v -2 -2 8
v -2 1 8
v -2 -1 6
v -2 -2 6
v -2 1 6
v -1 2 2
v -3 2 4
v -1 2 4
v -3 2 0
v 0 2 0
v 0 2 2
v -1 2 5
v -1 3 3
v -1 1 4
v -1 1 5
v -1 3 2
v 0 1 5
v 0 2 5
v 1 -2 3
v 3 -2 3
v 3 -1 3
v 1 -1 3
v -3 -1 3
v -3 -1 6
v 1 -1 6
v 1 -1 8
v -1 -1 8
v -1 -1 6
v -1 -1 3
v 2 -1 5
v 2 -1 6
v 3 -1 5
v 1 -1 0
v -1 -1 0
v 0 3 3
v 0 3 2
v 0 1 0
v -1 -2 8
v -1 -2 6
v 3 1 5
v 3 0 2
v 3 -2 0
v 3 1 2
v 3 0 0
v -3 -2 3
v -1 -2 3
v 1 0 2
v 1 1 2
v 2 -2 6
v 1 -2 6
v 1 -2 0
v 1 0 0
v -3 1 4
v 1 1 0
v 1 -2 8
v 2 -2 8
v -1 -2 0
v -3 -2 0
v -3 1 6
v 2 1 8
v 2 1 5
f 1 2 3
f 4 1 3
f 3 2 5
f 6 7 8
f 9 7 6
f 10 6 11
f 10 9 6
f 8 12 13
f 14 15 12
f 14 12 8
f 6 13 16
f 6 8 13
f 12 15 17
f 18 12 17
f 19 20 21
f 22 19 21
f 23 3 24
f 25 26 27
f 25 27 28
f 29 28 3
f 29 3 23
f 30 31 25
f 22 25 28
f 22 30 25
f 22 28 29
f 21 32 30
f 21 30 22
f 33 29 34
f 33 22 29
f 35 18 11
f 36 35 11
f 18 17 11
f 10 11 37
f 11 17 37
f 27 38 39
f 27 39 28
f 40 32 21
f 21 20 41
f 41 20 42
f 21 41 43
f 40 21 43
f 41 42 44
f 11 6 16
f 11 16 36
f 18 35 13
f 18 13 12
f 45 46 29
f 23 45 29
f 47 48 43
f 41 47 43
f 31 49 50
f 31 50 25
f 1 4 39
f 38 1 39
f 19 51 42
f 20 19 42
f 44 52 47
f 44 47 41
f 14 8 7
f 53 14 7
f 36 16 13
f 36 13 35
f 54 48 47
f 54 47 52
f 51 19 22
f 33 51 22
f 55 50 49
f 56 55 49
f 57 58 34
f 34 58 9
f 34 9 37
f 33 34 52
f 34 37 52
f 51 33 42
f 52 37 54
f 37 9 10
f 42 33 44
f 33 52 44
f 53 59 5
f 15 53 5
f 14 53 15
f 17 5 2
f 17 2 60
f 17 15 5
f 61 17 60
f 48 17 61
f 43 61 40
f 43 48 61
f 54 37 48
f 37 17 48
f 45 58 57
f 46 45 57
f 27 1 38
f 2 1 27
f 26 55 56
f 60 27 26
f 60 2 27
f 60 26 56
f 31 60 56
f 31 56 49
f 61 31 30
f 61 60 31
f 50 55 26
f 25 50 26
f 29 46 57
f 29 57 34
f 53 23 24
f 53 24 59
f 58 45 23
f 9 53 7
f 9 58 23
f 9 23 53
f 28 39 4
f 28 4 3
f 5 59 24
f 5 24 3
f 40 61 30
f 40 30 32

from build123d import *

# Parameters (mm, degrees)
SKETCH1_W           = 6
SKETCH1_H           = 4
BOSS_EXTRUDE1_DEPTH = 8
SKETCH2_W           = 2
SKETCH2_H           = 1
CUT_EXTRUDE1_DEPTH  = 9
SKETCH3_W           = 1
SKETCH3_H           = 2
SKETCH3_H_2         = 3
CUT_EXTRUDE2_DEPTH  = 5
SKETCH4_W           = 3
SKETCH4_H           = 1
CUT_EXTRUDE3_DEPTH  = 7
SKETCH5_OUTSIDE_W   = 10.154
SKETCH5_OUTSIDE_H   = 12.154
CUT_EXTRUDE4_DEPTH  = 1
SKETCH6_W           = 2
SKETCH6_H           = 2
CUT_EXTRUDE5_DEPTH  = 1
SKETCH7_W           = 1
SKETCH7_H           = 3
BOSS_EXTRUDE2_DEPTH = 1
CUT_EXTRUDE6_DEPTH  = 4


with BuildPart() as part:
    # Sketch1 → Boss-Extrude1 (new body)
    with BuildSketch(Plane.XY):
        Rectangle(SKETCH1_W, SKETCH1_H)
    extrude(amount=BOSS_EXTRUDE1_DEPTH)

    # Sketch2 → Cut-Extrude1 (cut, through all)
    with BuildSketch(Plane.XY.offset(8)):
        with Locations((0, -1.5)):
            Rectangle(SKETCH2_W, SKETCH2_H)
    extrude(amount=-CUT_EXTRUDE1_DEPTH, mode=Mode.SUBTRACT)

    # Sketch3 → Cut-Extrude2 (cut, through all)
    with BuildSketch(Plane(origin=(0, 2, 0), x_dir=(1, 0, 0), z_dir=(0, 1, 0))):
        with Locations((-2.5, -7)):
            Rectangle(SKETCH3_W, SKETCH3_H)
        with Locations((2.5, -6.5)):
            Rectangle(SKETCH3_W, SKETCH3_H_2)
    extrude(amount=-CUT_EXTRUDE2_DEPTH, mode=Mode.SUBTRACT)

    # Sketch4 → Cut-Extrude3 (cut, through all)
    with BuildSketch(Plane(origin=(3, 0, 0), x_dir=(0, 0, -1), z_dir=(1, 0, 0))):
        with Locations((-4.5, -1.5)):
            Rectangle(SKETCH4_W, SKETCH4_H)
    extrude(amount=-CUT_EXTRUDE3_DEPTH, mode=Mode.SUBTRACT)

    # Sketch5 outside → Cut-Extrude4 (cut)
    with BuildSketch(Plane(origin=(0, 2, 0), x_dir=(1, 0, 0), z_dir=(0, 1, 0))):
        with Locations((0, -4)):
            Rectangle(SKETCH5_OUTSIDE_W, SKETCH5_OUTSIDE_H)
        Polygon((-3, 0), (0, 0), (0, -5), (-1, -5), (-1, -4), (-3, -4), align=None, mode=Mode.SUBTRACT)
    extrude(amount=-CUT_EXTRUDE4_DEPTH, mode=Mode.SUBTRACT)

    # Sketch6 → Cut-Extrude5 (cut)
    with BuildSketch(Plane(origin=(0, 1, 0), x_dir=(1, 0, 0), z_dir=(0, 1, 0))):
        with Locations((2, -1)):
            Rectangle(SKETCH6_W, SKETCH6_H)
    extrude(amount=-CUT_EXTRUDE5_DEPTH, mode=Mode.SUBTRACT)

    # Sketch7 → Boss-Extrude2 (add)
    with BuildSketch(Plane(origin=(0, 2, 0), x_dir=(1, 0, 0), z_dir=(0, 1, 0))):
        with Locations((-0.5, -3.5)):
            Rectangle(SKETCH7_W, SKETCH7_H)
    extrude(amount=BOSS_EXTRUDE2_DEPTH)

    # Sketch8 → Cut-Extrude6 (cut, through all)
    with BuildSketch(Plane(origin=(0, 0, 0), x_dir=(0, 0, -1), z_dir=(1, 0, 0))):
        Polygon((-3, 3), (-5, 2), (-5, 3), align=None)
    extrude(amount=-CUT_EXTRUDE6_DEPTH, mode=Mode.SUBTRACT)


solid = part.part
